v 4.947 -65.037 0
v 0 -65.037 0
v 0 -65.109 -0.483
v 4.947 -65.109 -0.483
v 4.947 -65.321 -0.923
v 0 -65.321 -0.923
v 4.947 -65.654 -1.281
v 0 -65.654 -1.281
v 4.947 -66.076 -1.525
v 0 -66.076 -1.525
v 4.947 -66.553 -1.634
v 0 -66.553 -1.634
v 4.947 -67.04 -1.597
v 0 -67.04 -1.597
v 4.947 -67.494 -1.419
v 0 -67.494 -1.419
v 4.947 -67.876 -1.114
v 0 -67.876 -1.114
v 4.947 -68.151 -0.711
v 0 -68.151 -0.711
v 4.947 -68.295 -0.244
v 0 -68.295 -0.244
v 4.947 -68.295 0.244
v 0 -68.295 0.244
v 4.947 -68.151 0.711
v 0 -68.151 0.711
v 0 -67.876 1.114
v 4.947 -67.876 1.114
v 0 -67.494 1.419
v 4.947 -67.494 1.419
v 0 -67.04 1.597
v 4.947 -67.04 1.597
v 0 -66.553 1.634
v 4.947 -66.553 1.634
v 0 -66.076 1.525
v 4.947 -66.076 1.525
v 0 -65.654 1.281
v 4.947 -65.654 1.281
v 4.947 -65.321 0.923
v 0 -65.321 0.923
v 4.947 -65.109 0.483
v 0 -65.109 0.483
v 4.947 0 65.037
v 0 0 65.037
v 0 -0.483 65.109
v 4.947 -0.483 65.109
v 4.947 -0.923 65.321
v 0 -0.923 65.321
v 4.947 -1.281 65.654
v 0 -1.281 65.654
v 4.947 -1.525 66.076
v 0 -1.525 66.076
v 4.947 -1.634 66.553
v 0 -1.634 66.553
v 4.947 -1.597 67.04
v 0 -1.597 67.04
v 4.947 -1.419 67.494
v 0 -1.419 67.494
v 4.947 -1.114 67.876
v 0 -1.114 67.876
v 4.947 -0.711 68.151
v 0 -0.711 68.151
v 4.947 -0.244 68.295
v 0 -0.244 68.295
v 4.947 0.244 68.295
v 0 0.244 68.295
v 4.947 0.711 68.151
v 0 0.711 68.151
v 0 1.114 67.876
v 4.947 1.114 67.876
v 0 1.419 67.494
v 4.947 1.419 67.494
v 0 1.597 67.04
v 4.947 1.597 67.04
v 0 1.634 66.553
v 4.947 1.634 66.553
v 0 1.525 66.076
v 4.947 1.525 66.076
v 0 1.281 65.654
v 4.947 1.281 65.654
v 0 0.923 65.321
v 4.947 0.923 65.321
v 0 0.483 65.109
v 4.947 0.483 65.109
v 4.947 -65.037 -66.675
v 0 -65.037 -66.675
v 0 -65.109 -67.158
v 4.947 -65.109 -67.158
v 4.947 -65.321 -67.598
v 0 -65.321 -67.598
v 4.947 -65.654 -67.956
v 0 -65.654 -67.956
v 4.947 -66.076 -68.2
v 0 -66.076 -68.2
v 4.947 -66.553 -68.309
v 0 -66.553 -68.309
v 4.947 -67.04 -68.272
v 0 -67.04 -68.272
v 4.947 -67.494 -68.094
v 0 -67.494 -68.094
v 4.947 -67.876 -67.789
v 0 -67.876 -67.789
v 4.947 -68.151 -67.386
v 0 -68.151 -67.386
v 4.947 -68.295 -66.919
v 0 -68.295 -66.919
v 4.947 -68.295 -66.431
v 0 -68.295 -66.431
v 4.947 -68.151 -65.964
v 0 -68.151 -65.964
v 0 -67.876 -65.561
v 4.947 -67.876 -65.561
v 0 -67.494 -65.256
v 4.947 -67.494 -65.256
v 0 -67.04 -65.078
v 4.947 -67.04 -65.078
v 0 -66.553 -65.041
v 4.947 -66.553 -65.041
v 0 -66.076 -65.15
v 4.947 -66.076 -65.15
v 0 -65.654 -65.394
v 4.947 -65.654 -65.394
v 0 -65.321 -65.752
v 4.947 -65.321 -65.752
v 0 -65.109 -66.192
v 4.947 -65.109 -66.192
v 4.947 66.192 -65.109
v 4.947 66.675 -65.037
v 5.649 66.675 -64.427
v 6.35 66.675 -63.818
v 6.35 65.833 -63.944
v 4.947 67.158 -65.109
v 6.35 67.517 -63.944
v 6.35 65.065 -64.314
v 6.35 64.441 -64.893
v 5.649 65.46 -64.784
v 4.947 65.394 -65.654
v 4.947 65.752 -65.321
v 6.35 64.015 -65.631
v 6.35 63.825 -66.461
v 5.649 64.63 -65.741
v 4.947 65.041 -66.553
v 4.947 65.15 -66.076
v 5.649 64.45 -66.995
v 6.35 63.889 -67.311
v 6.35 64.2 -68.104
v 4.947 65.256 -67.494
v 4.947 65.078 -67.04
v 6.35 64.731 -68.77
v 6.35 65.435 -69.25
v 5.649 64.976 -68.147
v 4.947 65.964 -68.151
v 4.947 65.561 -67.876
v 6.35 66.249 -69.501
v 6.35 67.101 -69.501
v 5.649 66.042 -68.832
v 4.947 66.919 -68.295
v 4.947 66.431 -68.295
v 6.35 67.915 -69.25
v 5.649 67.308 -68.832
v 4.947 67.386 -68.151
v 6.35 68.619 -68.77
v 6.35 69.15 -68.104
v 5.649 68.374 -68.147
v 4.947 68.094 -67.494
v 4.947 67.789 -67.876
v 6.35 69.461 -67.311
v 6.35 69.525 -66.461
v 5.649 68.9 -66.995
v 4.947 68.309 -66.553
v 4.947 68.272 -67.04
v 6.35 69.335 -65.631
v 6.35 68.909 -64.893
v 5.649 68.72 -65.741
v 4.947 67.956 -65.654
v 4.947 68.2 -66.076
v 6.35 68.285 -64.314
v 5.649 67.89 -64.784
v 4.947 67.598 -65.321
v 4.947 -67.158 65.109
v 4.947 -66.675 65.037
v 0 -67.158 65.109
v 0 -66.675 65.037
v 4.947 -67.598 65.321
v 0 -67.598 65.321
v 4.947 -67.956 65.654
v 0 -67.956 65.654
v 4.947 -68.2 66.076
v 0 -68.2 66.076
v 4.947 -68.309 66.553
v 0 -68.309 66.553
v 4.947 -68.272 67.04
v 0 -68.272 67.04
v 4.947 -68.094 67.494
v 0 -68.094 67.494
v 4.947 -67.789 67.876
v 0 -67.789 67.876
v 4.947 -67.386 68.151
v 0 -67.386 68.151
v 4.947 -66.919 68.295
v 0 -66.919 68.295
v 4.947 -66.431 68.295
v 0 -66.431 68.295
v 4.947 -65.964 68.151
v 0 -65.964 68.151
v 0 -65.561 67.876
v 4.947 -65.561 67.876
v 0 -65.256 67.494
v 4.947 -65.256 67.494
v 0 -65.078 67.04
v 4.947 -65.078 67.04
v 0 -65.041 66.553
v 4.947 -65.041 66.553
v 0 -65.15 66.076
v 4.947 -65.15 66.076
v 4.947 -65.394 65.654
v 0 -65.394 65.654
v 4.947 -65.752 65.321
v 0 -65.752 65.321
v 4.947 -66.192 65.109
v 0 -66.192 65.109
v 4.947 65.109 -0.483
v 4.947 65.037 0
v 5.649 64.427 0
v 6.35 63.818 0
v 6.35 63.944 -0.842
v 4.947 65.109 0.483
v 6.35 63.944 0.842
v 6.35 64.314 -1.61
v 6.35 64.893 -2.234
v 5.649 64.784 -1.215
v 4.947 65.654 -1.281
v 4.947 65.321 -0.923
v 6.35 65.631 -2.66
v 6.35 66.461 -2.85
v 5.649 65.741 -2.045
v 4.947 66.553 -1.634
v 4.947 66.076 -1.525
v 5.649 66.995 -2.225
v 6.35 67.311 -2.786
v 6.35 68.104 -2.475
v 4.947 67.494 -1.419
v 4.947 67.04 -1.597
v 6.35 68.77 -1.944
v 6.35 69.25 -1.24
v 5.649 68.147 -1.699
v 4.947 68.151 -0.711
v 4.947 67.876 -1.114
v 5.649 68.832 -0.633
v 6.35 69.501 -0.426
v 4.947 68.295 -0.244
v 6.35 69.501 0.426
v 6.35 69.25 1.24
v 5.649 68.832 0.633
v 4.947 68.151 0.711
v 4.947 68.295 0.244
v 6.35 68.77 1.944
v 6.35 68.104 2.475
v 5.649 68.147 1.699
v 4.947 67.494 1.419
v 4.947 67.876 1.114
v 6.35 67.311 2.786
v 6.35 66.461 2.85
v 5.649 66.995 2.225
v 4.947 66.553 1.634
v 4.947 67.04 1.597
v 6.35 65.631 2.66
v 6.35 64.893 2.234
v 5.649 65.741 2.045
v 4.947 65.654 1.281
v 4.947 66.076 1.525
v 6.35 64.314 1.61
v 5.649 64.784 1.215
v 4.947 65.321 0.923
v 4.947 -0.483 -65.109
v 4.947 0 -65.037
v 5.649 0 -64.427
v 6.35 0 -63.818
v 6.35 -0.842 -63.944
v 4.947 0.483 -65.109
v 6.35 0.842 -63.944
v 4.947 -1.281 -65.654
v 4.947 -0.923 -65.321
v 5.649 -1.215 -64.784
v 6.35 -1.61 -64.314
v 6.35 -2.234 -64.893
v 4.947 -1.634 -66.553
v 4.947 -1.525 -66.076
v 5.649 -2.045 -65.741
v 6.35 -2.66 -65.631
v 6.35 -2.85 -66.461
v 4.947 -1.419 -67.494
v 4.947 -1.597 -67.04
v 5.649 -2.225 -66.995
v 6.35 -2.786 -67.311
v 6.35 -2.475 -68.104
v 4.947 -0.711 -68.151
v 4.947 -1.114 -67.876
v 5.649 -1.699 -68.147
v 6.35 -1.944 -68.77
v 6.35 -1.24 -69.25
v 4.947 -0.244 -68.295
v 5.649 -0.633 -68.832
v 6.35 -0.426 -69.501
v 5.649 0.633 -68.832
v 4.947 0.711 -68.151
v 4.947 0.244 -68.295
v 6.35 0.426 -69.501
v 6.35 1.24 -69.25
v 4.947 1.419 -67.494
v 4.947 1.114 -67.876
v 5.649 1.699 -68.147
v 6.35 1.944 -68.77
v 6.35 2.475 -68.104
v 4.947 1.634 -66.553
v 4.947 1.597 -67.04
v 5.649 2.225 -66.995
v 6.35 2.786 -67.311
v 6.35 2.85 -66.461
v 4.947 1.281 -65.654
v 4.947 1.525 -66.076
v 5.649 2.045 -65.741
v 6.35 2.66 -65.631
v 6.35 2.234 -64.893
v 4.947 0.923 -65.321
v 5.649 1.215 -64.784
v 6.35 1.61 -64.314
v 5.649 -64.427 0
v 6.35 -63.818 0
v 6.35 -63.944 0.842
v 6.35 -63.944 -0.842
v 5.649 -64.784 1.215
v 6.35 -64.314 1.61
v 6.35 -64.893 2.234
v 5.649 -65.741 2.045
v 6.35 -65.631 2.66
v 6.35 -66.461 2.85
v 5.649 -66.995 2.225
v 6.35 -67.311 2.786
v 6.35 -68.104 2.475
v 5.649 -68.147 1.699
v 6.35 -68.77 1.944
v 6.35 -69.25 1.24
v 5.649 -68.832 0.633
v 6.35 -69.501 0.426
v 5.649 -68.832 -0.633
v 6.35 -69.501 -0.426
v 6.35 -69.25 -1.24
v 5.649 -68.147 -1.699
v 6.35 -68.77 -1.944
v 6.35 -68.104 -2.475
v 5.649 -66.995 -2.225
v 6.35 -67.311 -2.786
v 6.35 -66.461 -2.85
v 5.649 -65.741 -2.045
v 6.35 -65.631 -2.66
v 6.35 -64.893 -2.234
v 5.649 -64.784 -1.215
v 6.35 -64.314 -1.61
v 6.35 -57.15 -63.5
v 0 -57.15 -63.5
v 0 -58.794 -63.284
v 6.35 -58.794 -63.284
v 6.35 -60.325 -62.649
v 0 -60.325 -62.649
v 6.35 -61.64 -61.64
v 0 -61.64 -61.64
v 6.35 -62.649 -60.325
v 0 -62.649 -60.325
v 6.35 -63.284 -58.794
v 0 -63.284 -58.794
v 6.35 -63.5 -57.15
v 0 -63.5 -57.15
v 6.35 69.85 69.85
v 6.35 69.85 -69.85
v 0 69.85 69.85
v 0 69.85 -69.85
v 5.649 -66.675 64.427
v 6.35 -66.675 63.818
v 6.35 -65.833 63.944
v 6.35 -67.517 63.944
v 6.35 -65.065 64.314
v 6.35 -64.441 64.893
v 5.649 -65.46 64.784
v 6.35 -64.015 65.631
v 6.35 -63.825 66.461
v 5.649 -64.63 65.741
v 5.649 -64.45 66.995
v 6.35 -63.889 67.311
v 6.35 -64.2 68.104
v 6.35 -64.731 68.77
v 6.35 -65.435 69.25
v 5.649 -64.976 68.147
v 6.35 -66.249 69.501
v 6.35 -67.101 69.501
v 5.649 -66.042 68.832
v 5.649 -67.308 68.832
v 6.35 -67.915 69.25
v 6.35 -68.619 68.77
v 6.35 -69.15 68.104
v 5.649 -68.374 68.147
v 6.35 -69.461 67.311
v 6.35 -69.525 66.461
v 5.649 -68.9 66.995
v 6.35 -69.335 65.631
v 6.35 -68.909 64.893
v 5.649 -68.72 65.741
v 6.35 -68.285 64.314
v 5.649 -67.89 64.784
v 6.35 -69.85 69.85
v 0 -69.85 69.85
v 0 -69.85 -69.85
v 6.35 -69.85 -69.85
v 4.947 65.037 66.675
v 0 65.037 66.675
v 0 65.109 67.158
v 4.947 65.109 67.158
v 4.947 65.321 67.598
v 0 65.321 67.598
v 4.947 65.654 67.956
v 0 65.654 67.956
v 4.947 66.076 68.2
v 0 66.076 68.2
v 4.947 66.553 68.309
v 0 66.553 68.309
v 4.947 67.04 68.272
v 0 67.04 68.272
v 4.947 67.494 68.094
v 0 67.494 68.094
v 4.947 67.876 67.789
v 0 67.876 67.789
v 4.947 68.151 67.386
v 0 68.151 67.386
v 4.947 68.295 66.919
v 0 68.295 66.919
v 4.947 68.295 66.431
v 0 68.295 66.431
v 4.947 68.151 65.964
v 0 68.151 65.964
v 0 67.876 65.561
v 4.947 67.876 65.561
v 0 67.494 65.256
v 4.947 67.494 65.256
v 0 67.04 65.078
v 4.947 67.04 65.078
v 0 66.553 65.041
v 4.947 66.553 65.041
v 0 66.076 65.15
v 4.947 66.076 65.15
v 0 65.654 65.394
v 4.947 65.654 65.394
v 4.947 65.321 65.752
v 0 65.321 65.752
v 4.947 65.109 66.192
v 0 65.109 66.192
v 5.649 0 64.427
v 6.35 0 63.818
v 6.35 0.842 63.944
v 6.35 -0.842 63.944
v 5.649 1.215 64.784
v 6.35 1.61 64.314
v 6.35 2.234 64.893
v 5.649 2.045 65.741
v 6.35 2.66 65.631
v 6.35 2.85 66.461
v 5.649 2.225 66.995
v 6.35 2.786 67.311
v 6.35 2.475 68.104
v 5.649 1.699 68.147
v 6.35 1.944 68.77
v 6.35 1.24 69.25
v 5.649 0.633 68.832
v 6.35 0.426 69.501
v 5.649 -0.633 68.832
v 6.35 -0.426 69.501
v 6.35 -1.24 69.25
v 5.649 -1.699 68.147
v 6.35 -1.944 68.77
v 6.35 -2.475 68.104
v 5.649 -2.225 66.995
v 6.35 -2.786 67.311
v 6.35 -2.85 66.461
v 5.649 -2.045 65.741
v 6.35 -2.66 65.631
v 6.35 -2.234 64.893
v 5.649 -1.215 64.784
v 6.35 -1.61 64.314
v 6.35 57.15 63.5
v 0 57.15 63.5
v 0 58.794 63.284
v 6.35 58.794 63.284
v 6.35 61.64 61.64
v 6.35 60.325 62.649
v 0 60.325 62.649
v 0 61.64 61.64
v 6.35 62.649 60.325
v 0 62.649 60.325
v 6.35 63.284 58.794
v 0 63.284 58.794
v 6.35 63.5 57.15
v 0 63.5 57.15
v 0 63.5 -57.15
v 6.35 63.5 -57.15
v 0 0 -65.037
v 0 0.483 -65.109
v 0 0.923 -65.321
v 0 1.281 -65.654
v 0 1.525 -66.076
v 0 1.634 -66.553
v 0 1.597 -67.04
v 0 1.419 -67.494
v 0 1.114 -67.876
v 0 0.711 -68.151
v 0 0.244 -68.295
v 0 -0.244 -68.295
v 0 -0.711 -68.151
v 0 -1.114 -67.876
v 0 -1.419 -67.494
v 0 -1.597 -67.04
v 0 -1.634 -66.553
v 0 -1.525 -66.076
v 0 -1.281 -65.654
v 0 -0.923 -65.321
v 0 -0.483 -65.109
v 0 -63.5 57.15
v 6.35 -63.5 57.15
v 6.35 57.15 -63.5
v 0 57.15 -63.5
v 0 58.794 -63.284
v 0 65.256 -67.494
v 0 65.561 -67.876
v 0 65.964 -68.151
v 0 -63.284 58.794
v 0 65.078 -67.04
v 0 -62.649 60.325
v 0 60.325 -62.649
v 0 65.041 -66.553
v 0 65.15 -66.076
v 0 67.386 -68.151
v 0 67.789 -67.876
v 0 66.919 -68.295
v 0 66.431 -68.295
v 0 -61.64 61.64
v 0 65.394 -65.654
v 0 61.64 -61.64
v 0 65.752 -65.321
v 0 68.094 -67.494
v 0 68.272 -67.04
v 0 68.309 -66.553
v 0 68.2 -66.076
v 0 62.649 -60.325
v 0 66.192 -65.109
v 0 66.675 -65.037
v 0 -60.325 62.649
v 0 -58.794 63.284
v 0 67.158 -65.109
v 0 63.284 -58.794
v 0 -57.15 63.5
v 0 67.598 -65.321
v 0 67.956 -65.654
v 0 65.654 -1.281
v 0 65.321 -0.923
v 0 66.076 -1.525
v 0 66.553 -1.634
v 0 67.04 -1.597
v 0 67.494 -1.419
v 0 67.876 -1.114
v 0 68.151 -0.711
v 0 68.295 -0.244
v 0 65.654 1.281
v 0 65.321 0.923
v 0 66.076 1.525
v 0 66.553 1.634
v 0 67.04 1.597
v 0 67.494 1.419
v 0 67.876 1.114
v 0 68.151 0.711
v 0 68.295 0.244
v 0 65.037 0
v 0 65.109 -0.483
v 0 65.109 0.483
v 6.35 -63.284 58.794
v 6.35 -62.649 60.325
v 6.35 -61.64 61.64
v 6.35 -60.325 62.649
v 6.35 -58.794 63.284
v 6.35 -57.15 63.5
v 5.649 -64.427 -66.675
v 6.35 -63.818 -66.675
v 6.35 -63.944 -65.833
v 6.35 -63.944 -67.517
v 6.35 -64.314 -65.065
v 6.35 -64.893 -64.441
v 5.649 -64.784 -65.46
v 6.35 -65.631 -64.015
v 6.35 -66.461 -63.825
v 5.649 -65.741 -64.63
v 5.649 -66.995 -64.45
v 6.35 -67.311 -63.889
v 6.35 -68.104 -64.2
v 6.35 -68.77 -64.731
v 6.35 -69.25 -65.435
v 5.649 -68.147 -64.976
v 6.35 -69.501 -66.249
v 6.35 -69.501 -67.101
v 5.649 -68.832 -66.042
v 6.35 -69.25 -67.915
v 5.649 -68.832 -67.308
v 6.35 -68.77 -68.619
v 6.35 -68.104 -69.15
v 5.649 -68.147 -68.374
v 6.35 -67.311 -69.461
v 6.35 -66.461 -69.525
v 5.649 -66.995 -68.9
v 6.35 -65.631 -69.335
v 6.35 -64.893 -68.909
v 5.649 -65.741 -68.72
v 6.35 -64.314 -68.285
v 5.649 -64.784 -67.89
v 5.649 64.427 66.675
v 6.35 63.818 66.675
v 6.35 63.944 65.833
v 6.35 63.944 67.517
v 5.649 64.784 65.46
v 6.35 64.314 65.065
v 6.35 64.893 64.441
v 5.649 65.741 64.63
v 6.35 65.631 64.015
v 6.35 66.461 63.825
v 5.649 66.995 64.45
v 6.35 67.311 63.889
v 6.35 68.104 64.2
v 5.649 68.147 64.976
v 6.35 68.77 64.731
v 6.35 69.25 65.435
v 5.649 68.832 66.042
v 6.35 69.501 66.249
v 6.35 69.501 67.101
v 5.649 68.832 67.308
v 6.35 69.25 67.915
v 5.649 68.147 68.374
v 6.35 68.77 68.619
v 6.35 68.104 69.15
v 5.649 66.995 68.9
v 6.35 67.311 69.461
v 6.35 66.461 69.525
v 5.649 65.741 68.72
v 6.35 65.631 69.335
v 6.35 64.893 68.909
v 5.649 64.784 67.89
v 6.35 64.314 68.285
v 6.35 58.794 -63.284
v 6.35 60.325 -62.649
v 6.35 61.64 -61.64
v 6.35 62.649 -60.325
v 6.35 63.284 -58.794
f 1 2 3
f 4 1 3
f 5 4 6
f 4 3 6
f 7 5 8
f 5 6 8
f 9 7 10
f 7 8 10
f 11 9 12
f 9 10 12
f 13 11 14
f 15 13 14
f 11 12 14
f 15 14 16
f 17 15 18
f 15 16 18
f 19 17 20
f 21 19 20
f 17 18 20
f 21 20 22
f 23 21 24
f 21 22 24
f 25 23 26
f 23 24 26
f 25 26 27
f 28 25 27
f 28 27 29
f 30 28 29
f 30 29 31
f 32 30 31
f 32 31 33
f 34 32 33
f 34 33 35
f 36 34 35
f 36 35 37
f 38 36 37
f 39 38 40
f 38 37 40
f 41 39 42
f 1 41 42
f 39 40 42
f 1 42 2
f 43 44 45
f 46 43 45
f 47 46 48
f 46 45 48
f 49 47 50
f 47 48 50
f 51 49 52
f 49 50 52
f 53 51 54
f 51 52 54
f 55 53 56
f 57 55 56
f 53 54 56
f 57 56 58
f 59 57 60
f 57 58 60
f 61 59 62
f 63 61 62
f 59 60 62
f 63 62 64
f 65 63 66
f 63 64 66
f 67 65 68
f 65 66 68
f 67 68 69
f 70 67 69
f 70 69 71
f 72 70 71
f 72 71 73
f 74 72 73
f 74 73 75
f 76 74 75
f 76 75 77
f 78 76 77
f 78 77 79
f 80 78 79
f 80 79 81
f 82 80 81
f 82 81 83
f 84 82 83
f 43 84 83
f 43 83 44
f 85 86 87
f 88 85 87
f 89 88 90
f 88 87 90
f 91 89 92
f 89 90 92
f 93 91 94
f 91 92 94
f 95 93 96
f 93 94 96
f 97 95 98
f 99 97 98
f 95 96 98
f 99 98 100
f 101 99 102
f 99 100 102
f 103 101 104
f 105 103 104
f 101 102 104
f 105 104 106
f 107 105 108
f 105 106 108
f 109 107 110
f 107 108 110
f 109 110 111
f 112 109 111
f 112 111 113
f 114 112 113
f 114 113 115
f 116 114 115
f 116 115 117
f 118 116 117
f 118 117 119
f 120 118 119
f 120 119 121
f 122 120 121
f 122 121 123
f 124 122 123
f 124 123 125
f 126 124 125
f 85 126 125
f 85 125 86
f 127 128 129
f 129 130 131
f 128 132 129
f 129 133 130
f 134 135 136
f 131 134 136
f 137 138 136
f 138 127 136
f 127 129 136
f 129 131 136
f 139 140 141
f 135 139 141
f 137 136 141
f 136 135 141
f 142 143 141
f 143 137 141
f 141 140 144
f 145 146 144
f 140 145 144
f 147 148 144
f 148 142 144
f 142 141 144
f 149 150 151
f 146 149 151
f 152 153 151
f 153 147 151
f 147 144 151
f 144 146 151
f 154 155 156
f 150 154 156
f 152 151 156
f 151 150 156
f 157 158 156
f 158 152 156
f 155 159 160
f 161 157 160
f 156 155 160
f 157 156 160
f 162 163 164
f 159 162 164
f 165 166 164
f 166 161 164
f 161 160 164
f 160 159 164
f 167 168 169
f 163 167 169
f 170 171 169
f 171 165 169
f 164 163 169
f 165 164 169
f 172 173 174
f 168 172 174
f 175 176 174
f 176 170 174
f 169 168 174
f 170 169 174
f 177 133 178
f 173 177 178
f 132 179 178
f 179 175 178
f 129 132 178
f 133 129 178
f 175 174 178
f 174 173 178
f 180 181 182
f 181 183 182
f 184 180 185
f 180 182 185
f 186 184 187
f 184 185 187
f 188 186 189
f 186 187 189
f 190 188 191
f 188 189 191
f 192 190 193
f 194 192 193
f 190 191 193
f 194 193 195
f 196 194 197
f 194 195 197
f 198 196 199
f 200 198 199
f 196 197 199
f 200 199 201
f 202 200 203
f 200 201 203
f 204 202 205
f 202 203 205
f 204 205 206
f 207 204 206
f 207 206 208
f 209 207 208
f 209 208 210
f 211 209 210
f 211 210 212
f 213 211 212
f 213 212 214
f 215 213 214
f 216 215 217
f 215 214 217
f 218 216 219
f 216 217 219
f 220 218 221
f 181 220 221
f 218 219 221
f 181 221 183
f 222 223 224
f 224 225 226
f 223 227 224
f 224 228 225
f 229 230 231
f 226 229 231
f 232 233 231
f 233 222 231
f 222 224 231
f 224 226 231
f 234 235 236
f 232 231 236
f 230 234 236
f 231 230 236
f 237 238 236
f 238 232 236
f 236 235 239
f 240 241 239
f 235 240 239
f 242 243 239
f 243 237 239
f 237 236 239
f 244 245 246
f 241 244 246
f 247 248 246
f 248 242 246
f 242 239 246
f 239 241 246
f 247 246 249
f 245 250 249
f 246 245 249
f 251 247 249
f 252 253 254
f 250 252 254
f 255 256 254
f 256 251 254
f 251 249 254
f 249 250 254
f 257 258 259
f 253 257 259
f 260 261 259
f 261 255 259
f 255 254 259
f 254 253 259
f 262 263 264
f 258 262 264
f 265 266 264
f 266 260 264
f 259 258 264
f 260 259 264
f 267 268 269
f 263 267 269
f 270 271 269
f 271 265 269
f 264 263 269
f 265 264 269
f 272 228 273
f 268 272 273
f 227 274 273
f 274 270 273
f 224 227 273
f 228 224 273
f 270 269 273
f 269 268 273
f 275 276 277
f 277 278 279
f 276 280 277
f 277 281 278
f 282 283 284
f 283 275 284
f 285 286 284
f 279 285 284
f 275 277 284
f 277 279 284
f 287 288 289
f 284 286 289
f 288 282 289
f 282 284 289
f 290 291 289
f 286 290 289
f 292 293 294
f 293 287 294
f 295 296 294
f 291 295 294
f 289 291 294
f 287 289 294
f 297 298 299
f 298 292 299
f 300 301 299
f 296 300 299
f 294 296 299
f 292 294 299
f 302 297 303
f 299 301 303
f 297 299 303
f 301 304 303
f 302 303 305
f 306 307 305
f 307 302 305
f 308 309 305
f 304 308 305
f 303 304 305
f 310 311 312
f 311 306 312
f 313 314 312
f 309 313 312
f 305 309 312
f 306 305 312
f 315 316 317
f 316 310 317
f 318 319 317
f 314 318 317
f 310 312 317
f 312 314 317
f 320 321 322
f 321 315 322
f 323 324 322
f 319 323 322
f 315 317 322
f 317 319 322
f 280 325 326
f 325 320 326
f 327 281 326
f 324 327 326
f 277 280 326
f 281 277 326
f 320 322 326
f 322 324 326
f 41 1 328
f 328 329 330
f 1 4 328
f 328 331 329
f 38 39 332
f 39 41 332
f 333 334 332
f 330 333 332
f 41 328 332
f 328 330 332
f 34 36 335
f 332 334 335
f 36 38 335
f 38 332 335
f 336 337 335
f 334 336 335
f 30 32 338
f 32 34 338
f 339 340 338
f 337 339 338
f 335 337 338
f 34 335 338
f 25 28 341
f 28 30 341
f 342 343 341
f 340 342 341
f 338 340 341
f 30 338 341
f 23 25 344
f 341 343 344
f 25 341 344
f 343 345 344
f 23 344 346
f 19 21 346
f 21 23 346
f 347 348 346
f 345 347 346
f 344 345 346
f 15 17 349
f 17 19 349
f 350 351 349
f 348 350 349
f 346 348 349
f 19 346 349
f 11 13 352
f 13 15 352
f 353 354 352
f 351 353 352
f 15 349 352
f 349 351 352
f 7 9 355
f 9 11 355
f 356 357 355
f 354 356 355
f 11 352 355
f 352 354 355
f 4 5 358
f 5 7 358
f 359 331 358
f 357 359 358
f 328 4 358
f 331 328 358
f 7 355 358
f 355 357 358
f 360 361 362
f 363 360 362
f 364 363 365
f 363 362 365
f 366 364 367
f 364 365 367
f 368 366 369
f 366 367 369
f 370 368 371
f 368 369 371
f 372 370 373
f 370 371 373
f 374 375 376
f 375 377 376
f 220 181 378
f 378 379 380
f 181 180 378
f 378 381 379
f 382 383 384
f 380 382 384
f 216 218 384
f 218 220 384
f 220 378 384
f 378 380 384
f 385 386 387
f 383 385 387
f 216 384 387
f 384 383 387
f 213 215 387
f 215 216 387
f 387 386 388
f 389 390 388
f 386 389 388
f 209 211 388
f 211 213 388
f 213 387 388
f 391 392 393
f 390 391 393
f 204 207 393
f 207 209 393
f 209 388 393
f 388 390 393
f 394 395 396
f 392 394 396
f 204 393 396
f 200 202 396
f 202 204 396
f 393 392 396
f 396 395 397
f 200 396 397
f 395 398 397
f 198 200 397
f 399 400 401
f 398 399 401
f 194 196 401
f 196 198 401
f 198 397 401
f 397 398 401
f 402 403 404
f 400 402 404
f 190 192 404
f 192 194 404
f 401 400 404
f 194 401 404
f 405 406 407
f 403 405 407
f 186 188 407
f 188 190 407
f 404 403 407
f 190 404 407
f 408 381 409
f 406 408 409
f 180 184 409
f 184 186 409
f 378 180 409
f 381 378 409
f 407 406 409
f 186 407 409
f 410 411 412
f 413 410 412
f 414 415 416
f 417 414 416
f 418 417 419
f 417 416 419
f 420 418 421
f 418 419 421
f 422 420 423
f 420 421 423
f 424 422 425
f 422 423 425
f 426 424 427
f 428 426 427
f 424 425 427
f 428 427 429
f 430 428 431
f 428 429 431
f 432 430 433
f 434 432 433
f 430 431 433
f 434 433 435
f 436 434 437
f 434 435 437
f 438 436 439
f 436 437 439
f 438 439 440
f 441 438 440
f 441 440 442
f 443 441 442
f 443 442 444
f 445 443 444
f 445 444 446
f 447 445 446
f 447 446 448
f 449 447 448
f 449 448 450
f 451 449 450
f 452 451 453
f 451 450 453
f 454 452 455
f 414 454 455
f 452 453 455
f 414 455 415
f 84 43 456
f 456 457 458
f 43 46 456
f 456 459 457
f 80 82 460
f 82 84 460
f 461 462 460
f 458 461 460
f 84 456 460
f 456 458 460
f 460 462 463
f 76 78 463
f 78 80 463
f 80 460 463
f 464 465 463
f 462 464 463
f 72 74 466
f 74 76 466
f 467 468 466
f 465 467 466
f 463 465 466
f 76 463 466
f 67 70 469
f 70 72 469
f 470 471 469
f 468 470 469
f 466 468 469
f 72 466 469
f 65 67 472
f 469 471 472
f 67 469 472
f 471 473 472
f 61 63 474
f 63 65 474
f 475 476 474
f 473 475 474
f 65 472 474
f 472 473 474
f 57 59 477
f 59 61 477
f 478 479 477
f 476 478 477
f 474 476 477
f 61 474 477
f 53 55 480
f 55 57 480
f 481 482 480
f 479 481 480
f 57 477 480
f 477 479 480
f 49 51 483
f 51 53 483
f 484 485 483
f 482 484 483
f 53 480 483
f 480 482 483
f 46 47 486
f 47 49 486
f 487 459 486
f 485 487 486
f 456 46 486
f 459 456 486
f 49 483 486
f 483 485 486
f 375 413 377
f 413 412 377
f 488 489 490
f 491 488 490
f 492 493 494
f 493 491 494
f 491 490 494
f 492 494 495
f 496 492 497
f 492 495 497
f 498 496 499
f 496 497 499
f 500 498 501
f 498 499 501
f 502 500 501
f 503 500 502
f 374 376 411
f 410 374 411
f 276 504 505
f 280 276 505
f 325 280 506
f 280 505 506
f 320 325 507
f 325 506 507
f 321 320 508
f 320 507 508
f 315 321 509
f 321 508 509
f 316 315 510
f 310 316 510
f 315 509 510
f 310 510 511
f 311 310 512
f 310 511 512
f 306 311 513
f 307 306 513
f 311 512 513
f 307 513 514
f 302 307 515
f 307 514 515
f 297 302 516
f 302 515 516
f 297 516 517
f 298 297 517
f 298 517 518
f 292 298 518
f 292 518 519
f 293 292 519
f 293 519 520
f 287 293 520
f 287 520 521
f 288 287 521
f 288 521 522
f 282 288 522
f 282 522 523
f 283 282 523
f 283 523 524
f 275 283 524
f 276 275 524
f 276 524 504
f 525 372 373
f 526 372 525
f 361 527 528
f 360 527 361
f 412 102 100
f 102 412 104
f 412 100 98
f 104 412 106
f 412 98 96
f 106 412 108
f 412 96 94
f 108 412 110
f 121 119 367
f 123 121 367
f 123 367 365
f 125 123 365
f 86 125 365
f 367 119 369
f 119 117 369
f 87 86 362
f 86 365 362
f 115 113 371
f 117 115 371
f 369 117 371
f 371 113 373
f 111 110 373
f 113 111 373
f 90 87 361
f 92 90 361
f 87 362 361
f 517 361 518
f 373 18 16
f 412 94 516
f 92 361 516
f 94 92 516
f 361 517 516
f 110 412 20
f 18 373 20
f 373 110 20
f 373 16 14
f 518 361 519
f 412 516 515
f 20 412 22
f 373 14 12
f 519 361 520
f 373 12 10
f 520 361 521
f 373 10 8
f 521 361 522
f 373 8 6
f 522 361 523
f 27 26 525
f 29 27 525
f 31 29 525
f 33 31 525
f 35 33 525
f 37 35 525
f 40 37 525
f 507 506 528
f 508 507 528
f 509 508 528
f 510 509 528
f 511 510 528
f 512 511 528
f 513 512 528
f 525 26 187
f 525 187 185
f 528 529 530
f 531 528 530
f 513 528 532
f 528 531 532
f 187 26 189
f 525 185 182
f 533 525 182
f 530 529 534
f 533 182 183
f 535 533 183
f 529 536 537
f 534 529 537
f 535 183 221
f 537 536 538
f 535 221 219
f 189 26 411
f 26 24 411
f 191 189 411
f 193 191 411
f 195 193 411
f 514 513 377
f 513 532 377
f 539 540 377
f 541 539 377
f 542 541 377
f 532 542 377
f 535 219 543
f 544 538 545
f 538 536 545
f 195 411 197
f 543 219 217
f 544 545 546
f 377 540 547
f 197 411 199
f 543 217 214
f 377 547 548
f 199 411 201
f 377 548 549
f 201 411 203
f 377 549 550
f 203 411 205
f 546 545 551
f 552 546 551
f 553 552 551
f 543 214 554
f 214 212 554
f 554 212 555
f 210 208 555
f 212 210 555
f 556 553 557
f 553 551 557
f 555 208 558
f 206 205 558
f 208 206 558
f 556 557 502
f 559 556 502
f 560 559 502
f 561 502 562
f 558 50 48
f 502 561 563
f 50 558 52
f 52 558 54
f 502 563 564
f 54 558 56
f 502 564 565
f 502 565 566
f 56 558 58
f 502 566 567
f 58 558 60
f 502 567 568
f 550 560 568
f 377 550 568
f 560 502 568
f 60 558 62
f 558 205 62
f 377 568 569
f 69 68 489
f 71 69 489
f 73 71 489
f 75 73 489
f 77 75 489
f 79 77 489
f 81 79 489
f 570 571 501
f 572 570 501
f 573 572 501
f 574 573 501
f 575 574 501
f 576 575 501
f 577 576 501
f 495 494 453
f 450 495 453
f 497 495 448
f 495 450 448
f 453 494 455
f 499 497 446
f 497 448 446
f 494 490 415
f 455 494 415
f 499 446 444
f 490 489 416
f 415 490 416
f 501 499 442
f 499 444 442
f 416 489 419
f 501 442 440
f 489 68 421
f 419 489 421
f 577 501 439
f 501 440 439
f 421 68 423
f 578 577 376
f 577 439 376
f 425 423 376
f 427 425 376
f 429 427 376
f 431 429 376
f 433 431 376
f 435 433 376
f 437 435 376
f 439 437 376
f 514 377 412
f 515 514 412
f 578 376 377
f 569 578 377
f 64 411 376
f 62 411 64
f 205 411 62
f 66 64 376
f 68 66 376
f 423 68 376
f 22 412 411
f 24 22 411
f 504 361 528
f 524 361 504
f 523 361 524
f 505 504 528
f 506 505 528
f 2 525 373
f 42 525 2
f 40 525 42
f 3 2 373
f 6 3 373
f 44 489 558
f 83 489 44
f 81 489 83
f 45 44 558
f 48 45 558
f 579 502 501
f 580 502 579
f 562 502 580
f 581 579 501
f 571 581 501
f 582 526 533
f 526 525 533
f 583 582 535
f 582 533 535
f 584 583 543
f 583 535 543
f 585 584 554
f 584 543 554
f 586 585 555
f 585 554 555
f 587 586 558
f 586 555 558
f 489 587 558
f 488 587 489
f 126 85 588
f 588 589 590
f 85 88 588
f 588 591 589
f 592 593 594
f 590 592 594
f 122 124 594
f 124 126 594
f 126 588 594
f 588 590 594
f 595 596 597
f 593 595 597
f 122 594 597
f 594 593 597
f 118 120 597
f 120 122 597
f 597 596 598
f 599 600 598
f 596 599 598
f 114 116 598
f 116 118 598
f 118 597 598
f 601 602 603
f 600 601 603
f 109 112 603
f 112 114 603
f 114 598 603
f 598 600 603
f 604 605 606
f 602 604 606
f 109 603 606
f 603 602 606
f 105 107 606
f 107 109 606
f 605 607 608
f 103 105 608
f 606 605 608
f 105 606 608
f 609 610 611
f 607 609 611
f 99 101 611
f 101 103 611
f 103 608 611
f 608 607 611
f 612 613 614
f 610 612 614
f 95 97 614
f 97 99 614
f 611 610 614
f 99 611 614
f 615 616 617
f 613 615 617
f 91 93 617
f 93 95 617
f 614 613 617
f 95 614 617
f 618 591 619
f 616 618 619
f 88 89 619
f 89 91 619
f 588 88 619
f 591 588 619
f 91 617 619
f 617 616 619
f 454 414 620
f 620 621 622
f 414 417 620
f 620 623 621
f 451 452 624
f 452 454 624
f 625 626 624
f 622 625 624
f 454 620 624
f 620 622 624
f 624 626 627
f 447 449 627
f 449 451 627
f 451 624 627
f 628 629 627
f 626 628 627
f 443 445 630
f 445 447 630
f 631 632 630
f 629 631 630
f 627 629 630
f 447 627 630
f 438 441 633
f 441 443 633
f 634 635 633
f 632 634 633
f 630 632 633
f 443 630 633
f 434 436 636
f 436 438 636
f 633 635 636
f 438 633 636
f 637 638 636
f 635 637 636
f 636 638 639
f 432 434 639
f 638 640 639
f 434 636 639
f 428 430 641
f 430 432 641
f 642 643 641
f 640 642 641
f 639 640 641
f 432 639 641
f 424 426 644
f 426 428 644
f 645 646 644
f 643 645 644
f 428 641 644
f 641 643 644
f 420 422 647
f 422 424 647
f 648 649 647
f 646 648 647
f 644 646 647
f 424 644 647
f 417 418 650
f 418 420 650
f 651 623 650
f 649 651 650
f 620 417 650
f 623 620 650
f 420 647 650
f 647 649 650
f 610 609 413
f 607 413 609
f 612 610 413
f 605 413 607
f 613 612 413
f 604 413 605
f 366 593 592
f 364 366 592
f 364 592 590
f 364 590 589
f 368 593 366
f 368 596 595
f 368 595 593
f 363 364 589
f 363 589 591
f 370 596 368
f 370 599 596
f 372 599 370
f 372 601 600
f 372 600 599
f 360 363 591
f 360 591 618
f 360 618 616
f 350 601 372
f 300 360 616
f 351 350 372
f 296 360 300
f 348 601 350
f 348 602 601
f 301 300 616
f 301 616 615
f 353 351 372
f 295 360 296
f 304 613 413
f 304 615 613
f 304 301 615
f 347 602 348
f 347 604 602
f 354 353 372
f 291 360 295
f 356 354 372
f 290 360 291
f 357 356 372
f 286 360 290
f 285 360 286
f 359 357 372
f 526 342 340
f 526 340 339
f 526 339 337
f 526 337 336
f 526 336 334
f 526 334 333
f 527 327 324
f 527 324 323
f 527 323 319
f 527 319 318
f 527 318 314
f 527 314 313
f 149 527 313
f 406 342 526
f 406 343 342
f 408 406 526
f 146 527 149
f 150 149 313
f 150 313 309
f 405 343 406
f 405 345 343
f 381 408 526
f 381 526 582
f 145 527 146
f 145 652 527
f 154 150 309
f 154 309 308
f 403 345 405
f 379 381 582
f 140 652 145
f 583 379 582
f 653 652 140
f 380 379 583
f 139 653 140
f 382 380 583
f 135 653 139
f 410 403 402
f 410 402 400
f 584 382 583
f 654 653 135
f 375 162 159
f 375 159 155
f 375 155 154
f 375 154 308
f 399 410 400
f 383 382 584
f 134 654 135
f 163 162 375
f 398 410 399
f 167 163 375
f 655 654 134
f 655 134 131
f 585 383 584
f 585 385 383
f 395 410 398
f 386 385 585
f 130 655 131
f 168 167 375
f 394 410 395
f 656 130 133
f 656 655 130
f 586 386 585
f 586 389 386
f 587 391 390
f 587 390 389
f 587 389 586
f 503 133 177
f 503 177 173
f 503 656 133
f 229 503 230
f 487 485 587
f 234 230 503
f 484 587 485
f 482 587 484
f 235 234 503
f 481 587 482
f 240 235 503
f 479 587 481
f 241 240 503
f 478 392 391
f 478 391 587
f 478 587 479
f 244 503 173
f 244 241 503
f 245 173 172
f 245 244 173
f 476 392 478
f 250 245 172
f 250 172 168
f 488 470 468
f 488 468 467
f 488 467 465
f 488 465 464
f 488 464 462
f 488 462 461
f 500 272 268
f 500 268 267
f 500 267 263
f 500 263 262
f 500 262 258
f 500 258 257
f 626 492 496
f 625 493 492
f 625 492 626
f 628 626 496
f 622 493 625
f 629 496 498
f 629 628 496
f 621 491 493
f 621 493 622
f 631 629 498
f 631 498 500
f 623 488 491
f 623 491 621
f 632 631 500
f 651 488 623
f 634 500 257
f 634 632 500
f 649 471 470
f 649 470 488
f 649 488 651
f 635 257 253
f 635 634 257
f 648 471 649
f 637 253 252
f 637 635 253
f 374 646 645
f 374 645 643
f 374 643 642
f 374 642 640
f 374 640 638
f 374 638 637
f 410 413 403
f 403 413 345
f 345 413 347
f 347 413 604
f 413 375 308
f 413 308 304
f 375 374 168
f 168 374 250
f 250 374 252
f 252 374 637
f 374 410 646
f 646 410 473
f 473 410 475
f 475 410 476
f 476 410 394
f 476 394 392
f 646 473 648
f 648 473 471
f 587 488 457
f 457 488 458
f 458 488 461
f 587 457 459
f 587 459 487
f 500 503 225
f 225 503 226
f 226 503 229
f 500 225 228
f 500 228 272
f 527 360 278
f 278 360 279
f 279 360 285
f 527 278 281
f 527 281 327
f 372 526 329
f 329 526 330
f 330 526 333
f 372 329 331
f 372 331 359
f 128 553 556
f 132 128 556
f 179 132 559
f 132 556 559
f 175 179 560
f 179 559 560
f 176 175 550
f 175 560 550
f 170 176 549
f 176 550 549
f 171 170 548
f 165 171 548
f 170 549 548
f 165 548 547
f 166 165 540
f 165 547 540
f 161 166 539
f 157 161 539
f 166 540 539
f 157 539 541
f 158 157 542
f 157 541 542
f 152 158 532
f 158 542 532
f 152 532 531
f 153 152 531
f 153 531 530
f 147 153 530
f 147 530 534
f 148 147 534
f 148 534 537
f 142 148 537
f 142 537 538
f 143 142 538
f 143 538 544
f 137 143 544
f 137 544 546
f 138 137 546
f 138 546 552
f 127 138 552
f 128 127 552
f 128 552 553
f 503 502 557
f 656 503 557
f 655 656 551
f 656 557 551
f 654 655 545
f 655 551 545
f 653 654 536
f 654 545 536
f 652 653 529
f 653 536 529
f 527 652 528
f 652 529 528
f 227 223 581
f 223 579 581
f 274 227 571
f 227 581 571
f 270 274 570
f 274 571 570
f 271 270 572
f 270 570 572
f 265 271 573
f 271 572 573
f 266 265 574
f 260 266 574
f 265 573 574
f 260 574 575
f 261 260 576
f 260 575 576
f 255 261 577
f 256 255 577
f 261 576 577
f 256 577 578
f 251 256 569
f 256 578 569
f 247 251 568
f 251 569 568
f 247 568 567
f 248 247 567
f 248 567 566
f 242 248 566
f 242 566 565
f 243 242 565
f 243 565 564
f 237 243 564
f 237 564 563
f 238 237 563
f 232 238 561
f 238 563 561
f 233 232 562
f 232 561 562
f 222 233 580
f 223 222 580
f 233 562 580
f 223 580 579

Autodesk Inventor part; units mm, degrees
ref_plane "YZ Plane" through (0, 0, 0) normal (1, 0, 0) x (0, 1, 0)
ref_plane "XZ Plane" through (0, 0, 0) normal (0, 1, 0) x (-1, 0, 0)
ref_plane "XY Plane" through (0, 0, 0) normal (0, 0, 1) x (1, 0, 0)
sketch "Sketch1" plane through (0, 0, 0) normal (1, 0, 0) x (0, 1, 0)
  line L0 (-69.85, -69.85) -> (69.85, -69.85)
  line L1 (69.85, -69.85) -> (69.85, 69.85)
  line L2 (69.85, 69.85) -> (-69.85, 69.85)
  line L3 (-69.85, 69.85) -> (-69.85, -69.85)
  line L4 (-69.85, -69.85) -> (69.85, 69.85) construction
  line L5 (69.85, -69.85) -> (-69.85, 69.85) construction
  point P0 (0, 0)
  dimension "d0" = 139.7
  dimension "d1" = 139.7
extrude "Extrusion1" add sketch "Sketch1" along normal blind 6.35
sketch "Sketch6" plane through (6.35, 0, 0) normal (1, 0, 0) x (0, 0, -1)
  line L0 (69.85, -69.85) -> (69.85, 69.85) projected
  line L1 (69.85, 69.85) -> (-69.85, 69.85) projected
  line L2 (-69.85, 69.85) -> (-69.85, -69.85) projected
  line L3 (-69.85, -69.85) -> (69.85, -69.85) projected
  point P0 (0, 0)
  point P1 (-66.675, -66.675)
  point P2 (-66.675, 0)
  dimension "d45" = 3.175
  dimension "d46" = 3.175
  dimension "d61" = 69.85
hole "Hole4" at (6.35, -66.675, 66.675) at (6.35, 0, 66.675) direction (-1, 0, 0) diameter 3.2766 end through all countersink diameter 5.715 countersink angle 82 clearance for "Flat Head Machine Screw (82)" size "#4" standard "Ansi Unified Screw Threads"
pattern_circular "Circular Pattern1" count 4 over 360 about axis through (-10, 0, 0) along (1, 0, 0) of "Hole4"
sketch "Sketch7" plane through (6.35, 0, 0) normal (1, 0, 0) x (0, 0, -1)
  circle A0 centre (-66.675, 66.675) radius 2.8575 projected
  circle A1 centre (66.675, 66.675) radius 2.8575 projected
  circle A2 centre (66.675, -66.675) radius 2.8575 projected
  circle A3 centre (-66.675, -66.675) radius 2.8575 projected
  line L0 (69.85, -69.85) -> (69.85, 69.85) projected
  line L1 (69.85, 69.85) -> (-69.85, 69.85) projected
  line L2 (-69.85, 69.85) -> (-69.85, -69.85) projected
  line L3 (-69.85, -69.85) -> (69.85, -69.85) projected
  line L4 (-63.5, -63.5) -> (-63.5, 63.5)
  line L5 (-63.5, 63.5) -> (63.5, 63.5)
  line L6 (63.5, 63.5) -> (63.5, -63.5)
  line L7 (63.5, -63.5) -> (-63.5, -63.5)
  point P0 (0, 0)
  dimension "d57" = 6.35
extrude "Extrusion3" cut sketch "Sketch7" against normal through all contours L4 L5 L6 L7
fillet "Fillet1" radius 6.35 4 edges at (3.175, -63.5, -63.5) (3.175, 63.5, 63.5) (3.175, -63.5, 63.5) (3.175, 63.5, -63.5)
equation "\"d0\" = width + 2 * plasticThickness"
equation "\"d1\" = height + 2 * plasticThickness"
equation "\"d2\" = caseThickness"
equation "\"d45\" = 0.5 * caseThickness"
equation "\"d46\" = 0.5 * caseThickness"
equation "\"d61\" = 0.5 * width + caseThickness"
equation "\"d57\" = caseThickness"
equation "\"d60\" = caseThickness"
equation "\"height\" = 127"
equation "\"width\" = 127"
equation "\"plasticThickness\" = 6.35"
equation "\"caseThickness\" = 6.35"
equation "\"alignmentGrooveDepth\" = 1.5875"
equation "\"alignmentGrooveClearance\" = 0.1016"
equation "\"aerogelHolderDepth\" = 49.022"
equation "\"depth\" = 203.2"
equation "\"mirrorAngle\" = 2.5deg"
equation "\"mirrorThickness\" = 3.175"
equation "\"fresnelThickness\" = 0.254"
equation "\"focalLength\" = 152.4"
equation "\"ior\" = 1.49"
equation "\"centerThickness\" = 1.27"
equation "\"fresnelAngle\" = 90deg"
equation "\"fresnelEffectiveDiameter\" = 152.4"
equation "\"frontPanelThickness\" = 1.5875"
equation "\"fresnelGrooveWidth\" = 1.778"
properties part number "frontClamp" material "Aluminum 6061"
